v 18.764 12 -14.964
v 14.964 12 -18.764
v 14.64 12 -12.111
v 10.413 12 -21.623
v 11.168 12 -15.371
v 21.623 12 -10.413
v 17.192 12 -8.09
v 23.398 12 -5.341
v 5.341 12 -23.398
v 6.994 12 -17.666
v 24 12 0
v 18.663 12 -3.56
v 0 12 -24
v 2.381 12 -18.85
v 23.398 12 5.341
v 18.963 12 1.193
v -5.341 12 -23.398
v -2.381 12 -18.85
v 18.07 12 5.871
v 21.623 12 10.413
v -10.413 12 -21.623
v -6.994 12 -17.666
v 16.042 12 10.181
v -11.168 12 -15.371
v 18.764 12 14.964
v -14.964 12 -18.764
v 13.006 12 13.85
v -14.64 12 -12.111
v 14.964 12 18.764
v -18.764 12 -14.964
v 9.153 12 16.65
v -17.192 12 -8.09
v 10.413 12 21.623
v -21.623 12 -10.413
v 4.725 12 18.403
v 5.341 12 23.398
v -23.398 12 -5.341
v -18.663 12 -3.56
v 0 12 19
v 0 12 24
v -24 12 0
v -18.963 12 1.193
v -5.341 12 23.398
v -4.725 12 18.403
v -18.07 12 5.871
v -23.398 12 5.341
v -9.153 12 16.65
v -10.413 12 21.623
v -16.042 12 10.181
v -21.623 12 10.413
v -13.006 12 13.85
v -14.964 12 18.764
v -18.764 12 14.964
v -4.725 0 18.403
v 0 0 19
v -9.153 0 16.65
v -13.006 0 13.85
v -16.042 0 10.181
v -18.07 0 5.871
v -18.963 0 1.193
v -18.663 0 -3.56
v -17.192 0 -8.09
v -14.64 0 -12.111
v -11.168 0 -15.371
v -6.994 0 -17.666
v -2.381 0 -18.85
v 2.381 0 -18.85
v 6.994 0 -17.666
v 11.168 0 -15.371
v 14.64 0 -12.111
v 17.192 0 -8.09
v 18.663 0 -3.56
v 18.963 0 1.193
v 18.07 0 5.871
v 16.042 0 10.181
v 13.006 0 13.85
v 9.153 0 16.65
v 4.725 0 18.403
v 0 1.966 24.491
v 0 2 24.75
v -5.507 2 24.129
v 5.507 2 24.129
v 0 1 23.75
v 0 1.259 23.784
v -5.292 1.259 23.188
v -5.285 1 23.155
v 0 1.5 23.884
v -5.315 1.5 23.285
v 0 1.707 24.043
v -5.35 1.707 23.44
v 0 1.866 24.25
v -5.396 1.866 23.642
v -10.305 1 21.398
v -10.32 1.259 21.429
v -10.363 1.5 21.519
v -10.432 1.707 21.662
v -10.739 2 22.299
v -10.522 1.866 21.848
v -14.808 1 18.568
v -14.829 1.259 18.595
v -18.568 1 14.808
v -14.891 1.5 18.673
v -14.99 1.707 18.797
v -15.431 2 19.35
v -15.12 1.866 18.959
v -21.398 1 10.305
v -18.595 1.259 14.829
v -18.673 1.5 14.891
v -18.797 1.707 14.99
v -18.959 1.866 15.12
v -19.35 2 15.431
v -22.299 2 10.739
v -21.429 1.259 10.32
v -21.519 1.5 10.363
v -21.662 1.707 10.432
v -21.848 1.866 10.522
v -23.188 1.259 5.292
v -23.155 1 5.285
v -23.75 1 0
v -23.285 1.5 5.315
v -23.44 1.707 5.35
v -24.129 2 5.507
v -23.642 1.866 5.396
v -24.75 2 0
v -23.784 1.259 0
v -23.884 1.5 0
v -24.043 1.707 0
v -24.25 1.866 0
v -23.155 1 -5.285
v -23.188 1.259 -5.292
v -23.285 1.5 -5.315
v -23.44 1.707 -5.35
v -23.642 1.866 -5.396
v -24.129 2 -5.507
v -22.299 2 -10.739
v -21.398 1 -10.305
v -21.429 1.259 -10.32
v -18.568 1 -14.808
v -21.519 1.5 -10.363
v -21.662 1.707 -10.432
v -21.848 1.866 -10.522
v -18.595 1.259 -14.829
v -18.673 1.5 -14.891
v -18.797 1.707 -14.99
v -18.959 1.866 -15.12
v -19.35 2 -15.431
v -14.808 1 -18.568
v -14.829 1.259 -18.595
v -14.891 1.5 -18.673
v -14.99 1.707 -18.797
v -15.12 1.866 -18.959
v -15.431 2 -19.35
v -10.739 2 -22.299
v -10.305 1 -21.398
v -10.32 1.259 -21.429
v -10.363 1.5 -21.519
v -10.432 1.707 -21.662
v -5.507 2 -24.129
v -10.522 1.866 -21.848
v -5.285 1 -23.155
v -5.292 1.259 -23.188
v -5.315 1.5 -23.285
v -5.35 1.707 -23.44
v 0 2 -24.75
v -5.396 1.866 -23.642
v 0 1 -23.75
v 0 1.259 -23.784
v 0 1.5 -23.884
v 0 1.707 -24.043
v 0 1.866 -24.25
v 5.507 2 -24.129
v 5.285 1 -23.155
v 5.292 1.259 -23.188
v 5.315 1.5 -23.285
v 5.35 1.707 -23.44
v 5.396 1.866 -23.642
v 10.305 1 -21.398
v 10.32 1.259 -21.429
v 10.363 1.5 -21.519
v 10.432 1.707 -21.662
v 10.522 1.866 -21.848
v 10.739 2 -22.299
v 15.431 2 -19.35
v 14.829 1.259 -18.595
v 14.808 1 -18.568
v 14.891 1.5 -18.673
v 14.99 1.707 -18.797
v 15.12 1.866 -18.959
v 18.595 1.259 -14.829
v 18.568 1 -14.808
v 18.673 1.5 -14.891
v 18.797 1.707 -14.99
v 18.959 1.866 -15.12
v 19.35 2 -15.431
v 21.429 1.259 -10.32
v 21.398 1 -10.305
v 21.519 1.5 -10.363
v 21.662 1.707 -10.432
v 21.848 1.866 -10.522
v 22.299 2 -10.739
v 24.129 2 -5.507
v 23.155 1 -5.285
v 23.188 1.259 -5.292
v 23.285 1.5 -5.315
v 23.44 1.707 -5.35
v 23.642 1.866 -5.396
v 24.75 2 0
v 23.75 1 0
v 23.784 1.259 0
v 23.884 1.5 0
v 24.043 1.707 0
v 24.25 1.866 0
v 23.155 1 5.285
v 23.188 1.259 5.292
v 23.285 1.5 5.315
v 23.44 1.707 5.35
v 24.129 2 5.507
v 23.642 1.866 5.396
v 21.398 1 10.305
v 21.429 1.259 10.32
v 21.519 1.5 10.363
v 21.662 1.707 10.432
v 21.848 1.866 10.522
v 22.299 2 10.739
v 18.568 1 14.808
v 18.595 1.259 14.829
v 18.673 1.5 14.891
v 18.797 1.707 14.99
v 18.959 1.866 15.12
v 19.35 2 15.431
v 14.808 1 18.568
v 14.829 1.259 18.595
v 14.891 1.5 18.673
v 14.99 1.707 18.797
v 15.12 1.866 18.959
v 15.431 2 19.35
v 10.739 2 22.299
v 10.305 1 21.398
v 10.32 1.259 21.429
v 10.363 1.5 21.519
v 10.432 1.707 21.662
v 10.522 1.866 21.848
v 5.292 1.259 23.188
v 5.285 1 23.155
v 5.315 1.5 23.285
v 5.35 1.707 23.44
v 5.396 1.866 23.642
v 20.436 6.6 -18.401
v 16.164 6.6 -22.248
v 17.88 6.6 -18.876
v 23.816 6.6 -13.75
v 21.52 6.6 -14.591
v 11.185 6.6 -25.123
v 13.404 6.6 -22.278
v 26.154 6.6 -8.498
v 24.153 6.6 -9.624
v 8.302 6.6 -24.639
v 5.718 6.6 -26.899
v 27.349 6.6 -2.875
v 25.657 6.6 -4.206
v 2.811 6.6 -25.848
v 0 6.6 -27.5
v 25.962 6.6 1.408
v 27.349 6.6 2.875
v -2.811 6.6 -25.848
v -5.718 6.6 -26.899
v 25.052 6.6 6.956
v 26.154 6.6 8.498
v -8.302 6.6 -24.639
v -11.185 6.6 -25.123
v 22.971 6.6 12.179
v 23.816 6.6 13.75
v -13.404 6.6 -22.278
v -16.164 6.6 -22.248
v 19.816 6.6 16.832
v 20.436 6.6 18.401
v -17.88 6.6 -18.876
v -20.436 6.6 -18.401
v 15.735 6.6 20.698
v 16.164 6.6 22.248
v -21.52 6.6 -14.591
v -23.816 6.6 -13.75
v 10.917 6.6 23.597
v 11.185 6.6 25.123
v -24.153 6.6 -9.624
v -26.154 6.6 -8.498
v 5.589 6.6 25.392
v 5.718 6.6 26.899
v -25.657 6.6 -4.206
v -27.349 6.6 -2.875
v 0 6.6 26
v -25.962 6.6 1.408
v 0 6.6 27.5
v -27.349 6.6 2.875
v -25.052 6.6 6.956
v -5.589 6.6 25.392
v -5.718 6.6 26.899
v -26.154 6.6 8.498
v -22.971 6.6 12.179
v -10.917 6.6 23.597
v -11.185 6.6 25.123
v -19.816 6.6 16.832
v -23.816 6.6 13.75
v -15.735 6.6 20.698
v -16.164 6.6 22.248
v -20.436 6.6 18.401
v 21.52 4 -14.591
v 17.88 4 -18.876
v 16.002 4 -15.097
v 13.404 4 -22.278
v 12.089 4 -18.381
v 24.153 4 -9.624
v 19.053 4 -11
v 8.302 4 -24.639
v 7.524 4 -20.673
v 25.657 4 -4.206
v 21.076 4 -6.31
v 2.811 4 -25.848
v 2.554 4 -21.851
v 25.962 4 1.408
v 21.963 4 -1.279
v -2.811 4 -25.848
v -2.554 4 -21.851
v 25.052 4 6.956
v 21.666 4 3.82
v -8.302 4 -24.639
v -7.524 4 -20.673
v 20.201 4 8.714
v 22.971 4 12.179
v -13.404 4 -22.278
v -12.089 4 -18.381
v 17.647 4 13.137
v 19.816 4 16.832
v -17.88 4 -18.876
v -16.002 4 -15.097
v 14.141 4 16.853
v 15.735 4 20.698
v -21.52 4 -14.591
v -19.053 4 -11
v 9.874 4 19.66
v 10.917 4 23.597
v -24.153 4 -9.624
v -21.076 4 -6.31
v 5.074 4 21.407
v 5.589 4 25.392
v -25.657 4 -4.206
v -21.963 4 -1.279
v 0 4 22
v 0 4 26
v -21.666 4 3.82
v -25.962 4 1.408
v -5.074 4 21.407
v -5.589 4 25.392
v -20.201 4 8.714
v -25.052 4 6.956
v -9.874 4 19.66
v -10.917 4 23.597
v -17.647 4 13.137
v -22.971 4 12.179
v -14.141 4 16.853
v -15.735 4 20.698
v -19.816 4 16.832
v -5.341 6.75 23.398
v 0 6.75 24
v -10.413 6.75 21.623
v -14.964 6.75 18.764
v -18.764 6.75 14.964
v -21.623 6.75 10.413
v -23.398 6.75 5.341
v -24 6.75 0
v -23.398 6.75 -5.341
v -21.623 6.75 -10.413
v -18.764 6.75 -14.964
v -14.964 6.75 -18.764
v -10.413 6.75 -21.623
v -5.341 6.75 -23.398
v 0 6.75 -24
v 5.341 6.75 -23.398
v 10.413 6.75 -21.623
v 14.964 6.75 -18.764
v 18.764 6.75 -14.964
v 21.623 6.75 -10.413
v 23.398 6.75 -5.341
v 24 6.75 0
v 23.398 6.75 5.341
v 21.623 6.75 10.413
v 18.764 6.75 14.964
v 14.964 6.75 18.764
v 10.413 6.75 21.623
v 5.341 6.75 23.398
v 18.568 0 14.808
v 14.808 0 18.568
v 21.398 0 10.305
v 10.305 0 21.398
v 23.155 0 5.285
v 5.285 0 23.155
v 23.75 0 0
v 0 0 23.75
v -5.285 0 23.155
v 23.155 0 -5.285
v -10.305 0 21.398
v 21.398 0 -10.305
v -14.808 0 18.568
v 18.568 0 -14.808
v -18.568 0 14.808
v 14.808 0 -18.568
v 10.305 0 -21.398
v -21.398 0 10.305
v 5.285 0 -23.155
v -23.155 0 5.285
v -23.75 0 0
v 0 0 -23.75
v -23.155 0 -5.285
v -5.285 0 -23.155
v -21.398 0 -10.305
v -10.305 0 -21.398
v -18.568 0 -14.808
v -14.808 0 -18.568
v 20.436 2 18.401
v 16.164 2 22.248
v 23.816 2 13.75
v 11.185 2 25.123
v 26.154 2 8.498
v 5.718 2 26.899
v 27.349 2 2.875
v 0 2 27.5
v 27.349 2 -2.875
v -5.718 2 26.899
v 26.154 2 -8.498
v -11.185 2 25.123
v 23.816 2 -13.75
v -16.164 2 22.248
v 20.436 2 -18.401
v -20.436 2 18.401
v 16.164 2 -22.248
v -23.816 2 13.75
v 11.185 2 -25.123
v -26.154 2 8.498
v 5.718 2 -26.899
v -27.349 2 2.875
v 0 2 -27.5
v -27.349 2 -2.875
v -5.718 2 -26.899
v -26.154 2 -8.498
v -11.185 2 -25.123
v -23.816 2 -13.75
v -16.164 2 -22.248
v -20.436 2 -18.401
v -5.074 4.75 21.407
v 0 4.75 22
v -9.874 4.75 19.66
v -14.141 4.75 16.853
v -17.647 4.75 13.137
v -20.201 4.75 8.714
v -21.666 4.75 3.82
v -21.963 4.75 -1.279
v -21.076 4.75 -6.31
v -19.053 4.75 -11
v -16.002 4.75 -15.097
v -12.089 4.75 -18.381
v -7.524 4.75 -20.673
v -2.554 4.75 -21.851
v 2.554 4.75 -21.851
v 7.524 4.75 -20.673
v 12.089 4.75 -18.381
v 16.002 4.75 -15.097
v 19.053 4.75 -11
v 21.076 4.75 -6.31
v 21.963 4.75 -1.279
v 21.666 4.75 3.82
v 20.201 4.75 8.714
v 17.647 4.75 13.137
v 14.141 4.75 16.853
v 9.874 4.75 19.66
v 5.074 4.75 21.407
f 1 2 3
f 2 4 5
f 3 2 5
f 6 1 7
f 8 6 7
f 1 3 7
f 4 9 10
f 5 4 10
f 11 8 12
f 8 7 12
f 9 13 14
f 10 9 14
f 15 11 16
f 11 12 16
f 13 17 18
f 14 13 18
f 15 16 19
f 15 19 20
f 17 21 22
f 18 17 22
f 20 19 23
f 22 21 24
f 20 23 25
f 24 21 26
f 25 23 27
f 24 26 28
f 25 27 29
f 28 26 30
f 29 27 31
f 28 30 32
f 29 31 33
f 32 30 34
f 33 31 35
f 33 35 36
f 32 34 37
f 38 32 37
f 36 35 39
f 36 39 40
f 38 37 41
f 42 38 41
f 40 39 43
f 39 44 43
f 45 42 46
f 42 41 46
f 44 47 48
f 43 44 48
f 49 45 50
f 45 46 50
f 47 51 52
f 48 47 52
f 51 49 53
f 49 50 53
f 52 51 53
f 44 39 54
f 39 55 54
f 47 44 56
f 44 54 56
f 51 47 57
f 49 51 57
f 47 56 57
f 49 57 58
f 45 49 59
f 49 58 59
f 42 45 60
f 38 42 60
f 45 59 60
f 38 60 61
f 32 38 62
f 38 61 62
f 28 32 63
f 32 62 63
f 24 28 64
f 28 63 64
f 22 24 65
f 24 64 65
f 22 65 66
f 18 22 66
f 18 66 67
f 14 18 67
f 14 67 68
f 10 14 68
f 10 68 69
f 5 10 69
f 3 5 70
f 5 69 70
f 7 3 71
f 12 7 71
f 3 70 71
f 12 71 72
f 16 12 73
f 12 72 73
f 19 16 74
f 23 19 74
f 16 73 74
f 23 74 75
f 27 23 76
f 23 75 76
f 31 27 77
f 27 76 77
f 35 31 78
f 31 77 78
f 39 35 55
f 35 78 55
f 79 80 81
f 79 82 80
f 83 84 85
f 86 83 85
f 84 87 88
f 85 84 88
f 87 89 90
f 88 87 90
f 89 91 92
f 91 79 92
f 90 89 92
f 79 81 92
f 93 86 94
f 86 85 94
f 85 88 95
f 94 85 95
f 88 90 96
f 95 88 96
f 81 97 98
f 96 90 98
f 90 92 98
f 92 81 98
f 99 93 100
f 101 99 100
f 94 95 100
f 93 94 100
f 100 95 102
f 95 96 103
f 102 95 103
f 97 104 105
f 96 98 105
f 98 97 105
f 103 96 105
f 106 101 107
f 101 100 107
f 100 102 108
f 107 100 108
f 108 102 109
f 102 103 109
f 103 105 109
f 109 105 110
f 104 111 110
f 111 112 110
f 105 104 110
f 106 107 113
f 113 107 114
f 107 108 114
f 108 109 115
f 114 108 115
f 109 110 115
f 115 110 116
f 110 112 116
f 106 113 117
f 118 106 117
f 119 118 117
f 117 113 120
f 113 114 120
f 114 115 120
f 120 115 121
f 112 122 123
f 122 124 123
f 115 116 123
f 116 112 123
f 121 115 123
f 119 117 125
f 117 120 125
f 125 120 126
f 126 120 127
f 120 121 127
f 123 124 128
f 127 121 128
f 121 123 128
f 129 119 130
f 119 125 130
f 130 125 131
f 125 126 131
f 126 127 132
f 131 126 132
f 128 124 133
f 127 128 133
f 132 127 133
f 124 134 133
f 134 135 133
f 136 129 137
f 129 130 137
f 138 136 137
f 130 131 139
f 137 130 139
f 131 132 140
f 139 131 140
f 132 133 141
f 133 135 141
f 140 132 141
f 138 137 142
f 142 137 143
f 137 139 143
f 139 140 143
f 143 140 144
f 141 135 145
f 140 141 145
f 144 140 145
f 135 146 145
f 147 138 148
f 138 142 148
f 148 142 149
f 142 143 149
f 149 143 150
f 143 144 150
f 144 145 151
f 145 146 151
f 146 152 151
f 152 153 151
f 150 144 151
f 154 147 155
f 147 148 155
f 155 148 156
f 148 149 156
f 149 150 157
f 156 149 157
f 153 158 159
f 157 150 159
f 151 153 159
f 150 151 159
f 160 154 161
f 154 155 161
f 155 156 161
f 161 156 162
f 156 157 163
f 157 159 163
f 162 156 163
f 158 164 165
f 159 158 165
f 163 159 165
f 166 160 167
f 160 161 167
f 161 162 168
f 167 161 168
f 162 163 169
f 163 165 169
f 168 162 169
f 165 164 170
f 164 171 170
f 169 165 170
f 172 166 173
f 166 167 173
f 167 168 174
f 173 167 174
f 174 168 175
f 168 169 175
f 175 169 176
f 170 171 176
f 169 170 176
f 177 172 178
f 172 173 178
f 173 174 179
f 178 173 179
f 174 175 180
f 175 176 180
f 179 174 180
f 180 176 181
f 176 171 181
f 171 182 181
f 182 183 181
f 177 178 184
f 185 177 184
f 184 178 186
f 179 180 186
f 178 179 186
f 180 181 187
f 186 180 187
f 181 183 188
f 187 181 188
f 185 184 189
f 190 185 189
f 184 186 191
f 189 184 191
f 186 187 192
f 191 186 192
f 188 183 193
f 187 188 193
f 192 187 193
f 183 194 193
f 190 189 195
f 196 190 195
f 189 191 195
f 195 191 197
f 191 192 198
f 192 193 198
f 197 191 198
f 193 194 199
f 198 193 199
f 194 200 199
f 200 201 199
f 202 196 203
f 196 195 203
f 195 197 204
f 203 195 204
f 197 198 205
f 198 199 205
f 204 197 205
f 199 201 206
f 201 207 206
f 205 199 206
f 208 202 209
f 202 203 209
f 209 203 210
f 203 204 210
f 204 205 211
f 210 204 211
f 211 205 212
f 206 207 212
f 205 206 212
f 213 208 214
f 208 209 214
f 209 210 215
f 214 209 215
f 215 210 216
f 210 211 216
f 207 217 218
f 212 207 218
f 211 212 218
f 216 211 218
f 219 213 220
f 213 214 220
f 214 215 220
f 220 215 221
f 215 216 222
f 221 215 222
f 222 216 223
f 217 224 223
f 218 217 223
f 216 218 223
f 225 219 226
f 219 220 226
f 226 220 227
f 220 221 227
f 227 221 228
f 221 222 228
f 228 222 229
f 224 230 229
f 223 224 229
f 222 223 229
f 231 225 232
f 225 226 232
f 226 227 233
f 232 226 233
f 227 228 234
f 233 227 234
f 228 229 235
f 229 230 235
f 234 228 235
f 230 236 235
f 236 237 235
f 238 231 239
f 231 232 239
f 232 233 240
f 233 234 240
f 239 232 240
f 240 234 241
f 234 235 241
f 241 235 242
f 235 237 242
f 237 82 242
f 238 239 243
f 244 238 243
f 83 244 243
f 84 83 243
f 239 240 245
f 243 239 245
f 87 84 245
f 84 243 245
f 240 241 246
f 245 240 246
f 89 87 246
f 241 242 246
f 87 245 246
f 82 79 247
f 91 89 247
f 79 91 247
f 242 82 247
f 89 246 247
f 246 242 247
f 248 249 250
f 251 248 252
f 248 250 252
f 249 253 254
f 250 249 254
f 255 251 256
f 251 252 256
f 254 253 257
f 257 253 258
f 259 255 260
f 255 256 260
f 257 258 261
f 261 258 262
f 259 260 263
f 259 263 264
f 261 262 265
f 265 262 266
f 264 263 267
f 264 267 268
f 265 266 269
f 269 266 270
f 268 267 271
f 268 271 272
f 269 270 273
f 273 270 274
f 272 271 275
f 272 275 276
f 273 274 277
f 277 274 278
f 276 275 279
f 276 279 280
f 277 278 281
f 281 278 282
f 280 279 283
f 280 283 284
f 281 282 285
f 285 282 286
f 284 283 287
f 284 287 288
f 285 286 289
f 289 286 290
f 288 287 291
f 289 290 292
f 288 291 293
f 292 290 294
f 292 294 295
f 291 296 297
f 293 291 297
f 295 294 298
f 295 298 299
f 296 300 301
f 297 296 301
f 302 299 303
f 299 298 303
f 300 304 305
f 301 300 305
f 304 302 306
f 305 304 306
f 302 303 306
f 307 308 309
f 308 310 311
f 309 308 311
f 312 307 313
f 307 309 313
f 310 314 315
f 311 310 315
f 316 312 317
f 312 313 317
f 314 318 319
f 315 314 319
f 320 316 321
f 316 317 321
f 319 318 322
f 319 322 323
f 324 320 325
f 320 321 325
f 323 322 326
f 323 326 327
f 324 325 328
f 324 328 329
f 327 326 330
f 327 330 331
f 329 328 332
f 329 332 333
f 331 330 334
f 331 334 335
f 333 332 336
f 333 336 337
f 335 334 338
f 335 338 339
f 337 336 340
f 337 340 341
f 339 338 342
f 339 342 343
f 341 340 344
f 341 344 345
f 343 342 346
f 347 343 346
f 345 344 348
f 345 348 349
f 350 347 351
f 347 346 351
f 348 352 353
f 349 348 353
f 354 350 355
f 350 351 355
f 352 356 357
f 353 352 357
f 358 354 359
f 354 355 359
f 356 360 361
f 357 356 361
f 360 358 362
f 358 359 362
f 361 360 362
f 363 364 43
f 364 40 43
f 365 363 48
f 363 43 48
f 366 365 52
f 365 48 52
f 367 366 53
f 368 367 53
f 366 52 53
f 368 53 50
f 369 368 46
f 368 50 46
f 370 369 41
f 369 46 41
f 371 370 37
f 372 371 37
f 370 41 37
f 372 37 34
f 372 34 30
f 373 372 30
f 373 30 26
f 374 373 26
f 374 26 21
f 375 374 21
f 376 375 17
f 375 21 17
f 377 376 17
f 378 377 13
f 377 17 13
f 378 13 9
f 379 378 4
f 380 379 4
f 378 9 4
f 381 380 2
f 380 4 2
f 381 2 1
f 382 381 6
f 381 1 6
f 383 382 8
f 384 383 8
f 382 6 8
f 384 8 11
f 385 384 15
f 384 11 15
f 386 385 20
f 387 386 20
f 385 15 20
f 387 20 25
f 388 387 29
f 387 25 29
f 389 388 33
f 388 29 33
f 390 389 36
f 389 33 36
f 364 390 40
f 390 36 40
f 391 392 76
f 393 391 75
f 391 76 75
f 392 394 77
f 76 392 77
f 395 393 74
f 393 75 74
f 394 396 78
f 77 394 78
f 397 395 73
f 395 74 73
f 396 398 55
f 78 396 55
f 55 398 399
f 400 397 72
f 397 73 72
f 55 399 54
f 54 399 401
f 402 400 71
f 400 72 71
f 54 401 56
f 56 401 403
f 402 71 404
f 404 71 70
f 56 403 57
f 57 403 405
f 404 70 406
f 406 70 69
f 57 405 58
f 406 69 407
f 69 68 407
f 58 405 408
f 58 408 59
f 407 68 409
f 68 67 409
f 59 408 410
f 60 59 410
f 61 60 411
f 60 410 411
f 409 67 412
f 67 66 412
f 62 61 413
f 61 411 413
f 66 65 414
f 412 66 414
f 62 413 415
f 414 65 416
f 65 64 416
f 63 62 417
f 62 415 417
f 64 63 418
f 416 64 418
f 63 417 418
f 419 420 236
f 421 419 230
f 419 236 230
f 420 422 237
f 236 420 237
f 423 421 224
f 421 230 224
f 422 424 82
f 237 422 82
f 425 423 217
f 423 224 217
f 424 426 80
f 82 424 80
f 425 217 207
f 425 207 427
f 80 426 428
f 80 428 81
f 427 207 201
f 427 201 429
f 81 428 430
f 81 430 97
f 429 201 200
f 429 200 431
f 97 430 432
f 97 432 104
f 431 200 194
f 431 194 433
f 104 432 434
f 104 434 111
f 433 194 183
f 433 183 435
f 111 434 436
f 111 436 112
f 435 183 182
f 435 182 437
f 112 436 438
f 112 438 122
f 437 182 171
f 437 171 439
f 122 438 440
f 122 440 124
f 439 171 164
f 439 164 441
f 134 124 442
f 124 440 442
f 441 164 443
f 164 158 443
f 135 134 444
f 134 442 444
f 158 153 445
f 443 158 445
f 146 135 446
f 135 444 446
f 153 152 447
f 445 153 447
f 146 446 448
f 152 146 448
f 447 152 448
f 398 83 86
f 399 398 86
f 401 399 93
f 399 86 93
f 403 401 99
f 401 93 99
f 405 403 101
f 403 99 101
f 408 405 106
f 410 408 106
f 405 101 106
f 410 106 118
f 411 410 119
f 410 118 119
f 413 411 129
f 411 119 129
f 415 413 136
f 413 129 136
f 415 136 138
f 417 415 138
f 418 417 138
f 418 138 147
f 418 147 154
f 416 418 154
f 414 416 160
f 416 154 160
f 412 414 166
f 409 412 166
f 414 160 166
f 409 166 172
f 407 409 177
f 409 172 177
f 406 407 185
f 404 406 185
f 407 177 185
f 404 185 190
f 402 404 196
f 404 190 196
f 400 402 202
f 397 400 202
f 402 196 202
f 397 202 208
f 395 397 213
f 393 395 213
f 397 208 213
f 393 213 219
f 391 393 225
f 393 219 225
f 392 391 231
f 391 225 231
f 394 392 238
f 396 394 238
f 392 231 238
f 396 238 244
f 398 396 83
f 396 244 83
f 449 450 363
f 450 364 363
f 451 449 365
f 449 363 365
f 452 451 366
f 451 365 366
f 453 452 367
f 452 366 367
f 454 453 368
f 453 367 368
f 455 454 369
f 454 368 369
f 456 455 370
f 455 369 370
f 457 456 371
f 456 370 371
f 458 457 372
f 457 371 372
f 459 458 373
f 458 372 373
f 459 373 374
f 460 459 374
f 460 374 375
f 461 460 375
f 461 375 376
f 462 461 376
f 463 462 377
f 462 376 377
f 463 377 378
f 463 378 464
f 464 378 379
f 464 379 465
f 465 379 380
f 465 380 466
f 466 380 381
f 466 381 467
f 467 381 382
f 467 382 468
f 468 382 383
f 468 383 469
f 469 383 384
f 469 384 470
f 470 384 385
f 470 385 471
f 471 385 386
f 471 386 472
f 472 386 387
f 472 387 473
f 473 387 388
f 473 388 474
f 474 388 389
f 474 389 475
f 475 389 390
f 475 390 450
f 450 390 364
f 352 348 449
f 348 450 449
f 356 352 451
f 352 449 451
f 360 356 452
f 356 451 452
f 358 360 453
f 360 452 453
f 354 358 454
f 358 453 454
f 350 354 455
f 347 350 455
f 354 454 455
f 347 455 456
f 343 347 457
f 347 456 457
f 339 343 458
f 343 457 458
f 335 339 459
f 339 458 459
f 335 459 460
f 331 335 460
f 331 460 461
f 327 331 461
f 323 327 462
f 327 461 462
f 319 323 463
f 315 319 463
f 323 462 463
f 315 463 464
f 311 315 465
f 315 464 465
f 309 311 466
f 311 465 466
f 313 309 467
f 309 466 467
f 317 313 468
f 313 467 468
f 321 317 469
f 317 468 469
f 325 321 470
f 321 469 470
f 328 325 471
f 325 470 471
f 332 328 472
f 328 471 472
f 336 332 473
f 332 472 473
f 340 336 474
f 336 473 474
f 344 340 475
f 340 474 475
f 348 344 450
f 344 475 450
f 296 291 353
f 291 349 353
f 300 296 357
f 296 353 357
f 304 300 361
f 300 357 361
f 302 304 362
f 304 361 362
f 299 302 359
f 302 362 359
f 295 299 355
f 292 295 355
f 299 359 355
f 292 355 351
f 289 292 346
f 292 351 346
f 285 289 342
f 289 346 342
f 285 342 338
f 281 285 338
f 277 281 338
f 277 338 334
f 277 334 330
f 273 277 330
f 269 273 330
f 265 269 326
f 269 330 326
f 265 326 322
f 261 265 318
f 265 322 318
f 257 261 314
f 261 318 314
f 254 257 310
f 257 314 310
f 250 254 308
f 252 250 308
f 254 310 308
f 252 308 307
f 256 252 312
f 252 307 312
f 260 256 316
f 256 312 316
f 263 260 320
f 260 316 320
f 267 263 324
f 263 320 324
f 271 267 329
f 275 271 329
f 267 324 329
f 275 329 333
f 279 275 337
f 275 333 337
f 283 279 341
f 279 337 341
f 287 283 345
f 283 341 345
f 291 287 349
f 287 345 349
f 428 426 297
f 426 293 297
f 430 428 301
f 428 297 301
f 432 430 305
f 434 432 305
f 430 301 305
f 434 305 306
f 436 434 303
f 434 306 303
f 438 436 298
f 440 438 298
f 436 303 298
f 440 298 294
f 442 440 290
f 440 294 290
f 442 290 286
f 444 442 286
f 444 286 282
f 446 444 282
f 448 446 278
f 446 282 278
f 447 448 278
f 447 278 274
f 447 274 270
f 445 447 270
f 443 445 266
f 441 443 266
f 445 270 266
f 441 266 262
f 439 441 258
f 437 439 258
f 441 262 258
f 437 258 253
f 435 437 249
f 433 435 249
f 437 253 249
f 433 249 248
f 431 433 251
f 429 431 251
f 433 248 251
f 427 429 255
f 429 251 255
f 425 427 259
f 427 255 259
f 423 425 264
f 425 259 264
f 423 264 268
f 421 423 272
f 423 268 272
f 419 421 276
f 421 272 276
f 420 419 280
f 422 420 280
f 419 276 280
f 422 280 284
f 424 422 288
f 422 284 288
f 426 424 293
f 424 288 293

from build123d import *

# Parameters (mm, degrees)
FILLET1_R = 1


with BuildPart() as part:
    # Sketch2 → Revolve1 (revolve)
    with BuildSketch(Plane.XY, mode=Mode.PRIVATE) as revolve1_sk:
        Polygon((-22, 4), (-22, 4.75), (-24, 6.75), (-24, 12), (-19, 12), (-19, 0), (-23.75, 0), (-23.75, 2), (-27.5, 2), (-27.5, 6.6), (-26, 6.6), (-26, 4), align=None)
    revolve(revolve1_sk.sketch.rotate(Axis((0, 74.572866062, 0), (0, -1, 0)), 270), axis=Axis((0, 74.572866062, 0), (0, -1, 0)))

    # Fillet1
    fillet1_edges = [part.edges().sort_by_distance(p)[0] for p in [
        (0, 2, -23.75),
    ]]
    fillet(fillet1_edges, radius=FILLET1_R)


solid = part.part
